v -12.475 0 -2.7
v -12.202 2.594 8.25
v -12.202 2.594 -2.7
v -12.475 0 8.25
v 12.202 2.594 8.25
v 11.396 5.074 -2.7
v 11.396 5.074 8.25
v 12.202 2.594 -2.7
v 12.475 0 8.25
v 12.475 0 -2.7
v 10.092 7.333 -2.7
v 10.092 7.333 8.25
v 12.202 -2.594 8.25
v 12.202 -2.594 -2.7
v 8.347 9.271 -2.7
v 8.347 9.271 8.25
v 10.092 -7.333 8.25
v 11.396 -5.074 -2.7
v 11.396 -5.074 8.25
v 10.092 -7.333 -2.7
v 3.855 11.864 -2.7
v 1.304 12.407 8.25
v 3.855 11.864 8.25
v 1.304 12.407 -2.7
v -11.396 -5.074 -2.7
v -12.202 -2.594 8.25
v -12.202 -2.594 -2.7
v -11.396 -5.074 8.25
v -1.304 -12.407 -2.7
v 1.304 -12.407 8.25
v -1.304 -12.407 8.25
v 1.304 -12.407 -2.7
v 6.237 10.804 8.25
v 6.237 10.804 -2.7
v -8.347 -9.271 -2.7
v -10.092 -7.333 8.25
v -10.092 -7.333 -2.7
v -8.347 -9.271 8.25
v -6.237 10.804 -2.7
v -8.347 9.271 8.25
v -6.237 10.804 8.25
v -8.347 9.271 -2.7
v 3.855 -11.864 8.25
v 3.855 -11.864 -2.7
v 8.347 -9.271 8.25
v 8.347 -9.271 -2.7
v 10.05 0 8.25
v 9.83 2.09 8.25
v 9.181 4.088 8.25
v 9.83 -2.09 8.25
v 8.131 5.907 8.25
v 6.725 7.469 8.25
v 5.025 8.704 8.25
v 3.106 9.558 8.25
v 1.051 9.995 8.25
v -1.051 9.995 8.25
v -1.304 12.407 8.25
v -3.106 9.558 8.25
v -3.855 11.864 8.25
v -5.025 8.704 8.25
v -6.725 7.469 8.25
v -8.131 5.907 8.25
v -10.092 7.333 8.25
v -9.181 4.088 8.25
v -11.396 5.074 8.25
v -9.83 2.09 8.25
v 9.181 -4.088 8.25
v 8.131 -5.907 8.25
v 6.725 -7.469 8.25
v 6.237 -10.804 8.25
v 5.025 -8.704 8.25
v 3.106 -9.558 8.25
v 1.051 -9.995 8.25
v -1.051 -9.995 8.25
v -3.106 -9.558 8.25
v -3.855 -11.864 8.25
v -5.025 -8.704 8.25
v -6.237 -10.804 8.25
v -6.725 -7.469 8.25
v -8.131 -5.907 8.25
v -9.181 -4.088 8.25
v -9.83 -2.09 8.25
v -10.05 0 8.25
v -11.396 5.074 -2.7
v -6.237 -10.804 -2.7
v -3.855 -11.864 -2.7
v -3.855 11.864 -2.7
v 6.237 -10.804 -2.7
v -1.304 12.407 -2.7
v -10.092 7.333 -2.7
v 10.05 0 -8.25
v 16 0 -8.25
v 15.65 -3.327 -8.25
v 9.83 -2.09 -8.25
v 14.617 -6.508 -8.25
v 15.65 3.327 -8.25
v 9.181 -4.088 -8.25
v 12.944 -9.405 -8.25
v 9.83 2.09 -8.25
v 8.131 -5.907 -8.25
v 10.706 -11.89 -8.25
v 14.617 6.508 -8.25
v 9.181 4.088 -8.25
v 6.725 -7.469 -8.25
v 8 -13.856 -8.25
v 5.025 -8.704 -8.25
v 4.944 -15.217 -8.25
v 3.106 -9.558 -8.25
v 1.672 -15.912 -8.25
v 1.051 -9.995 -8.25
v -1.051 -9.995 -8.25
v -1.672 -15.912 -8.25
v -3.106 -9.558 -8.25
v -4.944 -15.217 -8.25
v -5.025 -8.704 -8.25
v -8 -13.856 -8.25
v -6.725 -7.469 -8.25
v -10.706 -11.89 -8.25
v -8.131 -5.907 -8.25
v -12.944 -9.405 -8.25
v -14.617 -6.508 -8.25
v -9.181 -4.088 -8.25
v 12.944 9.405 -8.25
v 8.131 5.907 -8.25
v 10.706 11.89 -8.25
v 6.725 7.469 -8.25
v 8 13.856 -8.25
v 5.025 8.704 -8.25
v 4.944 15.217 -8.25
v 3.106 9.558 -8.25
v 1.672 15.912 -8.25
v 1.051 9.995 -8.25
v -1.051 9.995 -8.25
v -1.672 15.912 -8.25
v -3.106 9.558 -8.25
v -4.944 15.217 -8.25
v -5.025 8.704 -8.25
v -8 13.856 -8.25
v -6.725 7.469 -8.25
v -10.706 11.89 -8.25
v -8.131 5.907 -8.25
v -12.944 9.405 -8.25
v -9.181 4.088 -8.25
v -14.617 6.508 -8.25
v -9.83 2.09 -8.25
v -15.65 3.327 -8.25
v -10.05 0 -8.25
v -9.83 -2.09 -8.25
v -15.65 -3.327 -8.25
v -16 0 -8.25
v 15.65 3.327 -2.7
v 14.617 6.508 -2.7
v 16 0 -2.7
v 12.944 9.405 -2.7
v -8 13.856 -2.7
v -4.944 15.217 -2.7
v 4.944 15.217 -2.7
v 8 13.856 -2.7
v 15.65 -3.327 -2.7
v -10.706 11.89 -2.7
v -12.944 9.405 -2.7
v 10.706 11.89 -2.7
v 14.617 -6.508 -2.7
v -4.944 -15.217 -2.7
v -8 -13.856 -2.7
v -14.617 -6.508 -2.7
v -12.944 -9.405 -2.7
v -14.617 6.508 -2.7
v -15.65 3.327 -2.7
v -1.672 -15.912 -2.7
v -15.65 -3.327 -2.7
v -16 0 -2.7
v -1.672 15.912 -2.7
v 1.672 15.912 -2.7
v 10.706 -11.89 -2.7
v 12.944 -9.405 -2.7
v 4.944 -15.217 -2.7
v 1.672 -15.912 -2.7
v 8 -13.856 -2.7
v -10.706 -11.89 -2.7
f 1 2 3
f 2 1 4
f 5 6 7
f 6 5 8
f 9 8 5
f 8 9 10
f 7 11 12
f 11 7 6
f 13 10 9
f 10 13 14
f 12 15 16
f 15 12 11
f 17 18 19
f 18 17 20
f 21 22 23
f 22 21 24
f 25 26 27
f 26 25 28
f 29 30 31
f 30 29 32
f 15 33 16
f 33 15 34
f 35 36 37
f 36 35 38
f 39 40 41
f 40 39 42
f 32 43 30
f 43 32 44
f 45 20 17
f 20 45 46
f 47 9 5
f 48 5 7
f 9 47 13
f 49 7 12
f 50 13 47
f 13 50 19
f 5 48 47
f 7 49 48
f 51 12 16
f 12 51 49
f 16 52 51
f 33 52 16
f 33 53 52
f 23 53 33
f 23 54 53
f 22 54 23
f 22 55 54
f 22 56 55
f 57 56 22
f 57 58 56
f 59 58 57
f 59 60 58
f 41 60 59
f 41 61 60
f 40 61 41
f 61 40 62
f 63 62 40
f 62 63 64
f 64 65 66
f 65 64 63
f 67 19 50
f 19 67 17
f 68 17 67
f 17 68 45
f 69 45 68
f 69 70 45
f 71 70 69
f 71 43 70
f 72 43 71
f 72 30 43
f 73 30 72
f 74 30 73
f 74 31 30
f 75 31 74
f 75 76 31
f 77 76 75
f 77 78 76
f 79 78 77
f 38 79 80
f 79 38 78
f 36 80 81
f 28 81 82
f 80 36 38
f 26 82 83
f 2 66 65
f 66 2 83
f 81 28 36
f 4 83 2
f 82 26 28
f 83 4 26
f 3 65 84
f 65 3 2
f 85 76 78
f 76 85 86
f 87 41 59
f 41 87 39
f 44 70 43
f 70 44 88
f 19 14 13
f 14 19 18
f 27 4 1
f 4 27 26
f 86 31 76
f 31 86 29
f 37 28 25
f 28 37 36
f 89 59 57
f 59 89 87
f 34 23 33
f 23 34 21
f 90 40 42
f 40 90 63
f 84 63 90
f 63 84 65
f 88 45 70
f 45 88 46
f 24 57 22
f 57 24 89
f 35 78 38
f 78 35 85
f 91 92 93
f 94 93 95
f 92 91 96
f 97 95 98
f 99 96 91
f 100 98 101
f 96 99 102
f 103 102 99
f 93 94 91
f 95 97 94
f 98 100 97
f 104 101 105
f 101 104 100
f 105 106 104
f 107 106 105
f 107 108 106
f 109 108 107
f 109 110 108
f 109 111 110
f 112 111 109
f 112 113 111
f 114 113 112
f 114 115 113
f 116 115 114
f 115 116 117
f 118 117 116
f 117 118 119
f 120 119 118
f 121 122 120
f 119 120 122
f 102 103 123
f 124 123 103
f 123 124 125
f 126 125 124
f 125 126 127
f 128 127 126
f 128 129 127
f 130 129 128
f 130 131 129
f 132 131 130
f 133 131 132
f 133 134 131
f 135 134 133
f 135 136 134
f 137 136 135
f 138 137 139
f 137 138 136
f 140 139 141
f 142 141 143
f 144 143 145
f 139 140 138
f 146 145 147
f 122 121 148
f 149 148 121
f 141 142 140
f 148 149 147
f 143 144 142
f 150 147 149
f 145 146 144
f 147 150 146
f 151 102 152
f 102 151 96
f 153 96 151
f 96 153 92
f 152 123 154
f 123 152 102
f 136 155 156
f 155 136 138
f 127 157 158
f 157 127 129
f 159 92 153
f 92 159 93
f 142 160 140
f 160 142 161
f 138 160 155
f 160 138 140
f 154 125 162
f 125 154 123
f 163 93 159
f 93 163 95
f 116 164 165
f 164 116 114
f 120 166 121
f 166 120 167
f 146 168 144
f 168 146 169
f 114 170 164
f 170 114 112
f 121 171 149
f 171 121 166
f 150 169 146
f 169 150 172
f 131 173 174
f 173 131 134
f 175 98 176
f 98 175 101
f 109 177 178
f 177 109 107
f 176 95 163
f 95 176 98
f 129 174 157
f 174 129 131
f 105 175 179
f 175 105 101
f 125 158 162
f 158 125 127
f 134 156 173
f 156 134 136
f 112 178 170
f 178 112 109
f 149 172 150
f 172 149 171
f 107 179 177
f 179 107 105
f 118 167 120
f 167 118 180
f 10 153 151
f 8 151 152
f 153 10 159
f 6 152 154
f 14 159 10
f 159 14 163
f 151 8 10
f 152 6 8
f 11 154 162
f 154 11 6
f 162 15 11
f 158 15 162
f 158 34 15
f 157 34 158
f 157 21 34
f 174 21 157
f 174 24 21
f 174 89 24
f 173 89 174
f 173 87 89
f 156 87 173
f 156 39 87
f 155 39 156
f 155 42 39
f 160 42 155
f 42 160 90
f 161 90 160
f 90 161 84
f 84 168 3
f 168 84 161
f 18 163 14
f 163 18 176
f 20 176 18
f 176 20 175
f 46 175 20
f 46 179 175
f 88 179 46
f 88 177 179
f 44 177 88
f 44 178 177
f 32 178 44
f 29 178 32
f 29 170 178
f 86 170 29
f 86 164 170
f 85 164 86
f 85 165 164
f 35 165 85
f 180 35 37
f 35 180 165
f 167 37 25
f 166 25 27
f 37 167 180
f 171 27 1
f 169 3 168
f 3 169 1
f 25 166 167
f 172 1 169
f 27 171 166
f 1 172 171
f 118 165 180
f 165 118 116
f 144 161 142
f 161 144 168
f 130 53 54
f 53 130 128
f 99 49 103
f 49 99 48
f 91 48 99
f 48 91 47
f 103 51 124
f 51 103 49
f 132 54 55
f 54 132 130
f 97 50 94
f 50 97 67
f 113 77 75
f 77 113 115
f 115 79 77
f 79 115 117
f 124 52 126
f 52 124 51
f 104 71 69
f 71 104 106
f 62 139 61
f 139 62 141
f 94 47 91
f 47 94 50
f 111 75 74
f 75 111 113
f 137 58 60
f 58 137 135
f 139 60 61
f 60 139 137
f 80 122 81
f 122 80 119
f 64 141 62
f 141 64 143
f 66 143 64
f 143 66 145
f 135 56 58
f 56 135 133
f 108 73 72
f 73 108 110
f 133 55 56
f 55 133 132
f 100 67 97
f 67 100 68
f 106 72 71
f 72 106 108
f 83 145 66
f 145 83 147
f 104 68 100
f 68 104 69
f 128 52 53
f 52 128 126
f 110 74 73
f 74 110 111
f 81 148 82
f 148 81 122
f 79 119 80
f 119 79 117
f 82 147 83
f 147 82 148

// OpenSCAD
// file: spacerUtils.scad
/**
 * @file spacerUtils.scad
 *
 * @version 1.0
 *
 * @author Calum Judd Anderson
 *
 * @brief Aprilia RS 125 2006-2011 spacer utilities
 */
INTERFERENCE_FIT = 0.001;
SLIDE_FIT = 0.05;

SPROCKET_CARRIER_SPACER_HEIGHT = 17;
BRAKE_CARRIER_SPACER_HEIGHT = 15.25;

SPACER_OUTER_RADIUS = 15;
SPINDLE_RADIUS = 10;
SWINGING_ARM_FACE_RADIUS = 17.5;
SWINGING_ARM_FACE_HEIGHT = 5;

CAPTIVE_LIP_HEIGHT = 1.75;
CAPTIVE_LIP_RADIUS = SPACER_OUTER_RADIUS + 0.5;

SPROCKET_CARRIER_INNER_BEARING_SPACER_HEIGHT = 16.5;

SPROCKET_CARRIER_INNER_BEARING_OUTER_RADIUS = 12.475;
SPROCKET_CARRIER_INNER_BEARING_FACE_RADIUS = 16;
SPROCKET_CARRIER_INNER_BEARING_FACE_HEIGHT = 5.55;

/**
 * @brief Aprilia RS 125 2006-2011 rear brake carrier side spacer with captive flange
 */
module brakeCarrierSpacer() {
    difference() {
        union() {
            cylinder(BRAKE_CARRIER_SPACER_HEIGHT, SPACER_OUTER_RADIUS, SPACER_OUTER_RADIUS, center=true);
            translate([0, 0, (-(BRAKE_CARRIER_SPACER_HEIGHT -SWINGING_ARM_FACE_HEIGHT)/2)])
                cylinder(SWINGING_ARM_FACE_HEIGHT, SWINGING_ARM_FACE_RADIUS, SWINGING_ARM_FACE_RADIUS, center=true);
            translate([0, 0, ((BRAKE_CARRIER_SPACER_HEIGHT - CAPTIVE_LIP_HEIGHT)/2)])
                cylinder(CAPTIVE_LIP_HEIGHT, CAPTIVE_LIP_RADIUS, CAPTIVE_LIP_RADIUS, center=true);
        }
        cylinder(BRAKE_CARRIER_SPACER_HEIGHT + INTERFERENCE_FIT, SPINDLE_RADIUS + SLIDE_FIT, SPINDLE_RADIUS + SLIDE_FIT, center=true);
    }
}

/**
 * @brief Aprilia RS 125 2006-2011 rear sprocket carrier side internal spacer
 */
module sprocketCarrierInnerBearingSpacer() {
    difference() {
        union() {
            cylinder(SPROCKET_CARRIER_INNER_BEARING_SPACER_HEIGHT, SPROCKET_CARRIER_INNER_BEARING_OUTER_RADIUS, SPROCKET_CARRIER_INNER_BEARING_OUTER_RADIUS, center=true);
            translate([0, 0, (-(SPROCKET_CARRIER_INNER_BEARING_SPACER_HEIGHT -SPROCKET_CARRIER_INNER_BEARING_FACE_HEIGHT)/2)])
                cylinder(SPROCKET_CARRIER_INNER_BEARING_FACE_HEIGHT, SPROCKET_CARRIER_INNER_BEARING_FACE_RADIUS, SPROCKET_CARRIER_INNER_BEARING_FACE_RADIUS, center=true);
        }
        cylinder(SPROCKET_CARRIER_INNER_BEARING_SPACER_HEIGHT + INTERFERENCE_FIT, SPINDLE_RADIUS + SLIDE_FIT, SPINDLE_RADIUS + SLIDE_FIT, center=true);
    }
}

/**
 * @brief Aprilia RS 125 2006-2011 rear sprocket carrier side spacer with captive flange
 */
module sprocketCarrierSpacer() {
    difference() {
        union() {
            cylinder(SPROCKET_CARRIER_SPACER_HEIGHT, SPACER_OUTER_RADIUS, SPACER_OUTER_RADIUS, center=true);
            translate([0, 0, (-(SPROCKET_CARRIER_SPACER_HEIGHT -SWINGING_ARM_FACE_HEIGHT)/2)])
                cylinder(SWINGING_ARM_FACE_HEIGHT, SWINGING_ARM_FACE_RADIUS, SWINGING_ARM_FACE_RADIUS, center=true);
            translate([0, 0, ((SPROCKET_CARRIER_SPACER_HEIGHT - CAPTIVE_LIP_HEIGHT)/2)])
                cylinder(CAPTIVE_LIP_HEIGHT, CAPTIVE_LIP_RADIUS, CAPTIVE_LIP_RADIUS, center=true);
        }
        cylinder(SPROCKET_CARRIER_SPACER_HEIGHT + INTERFERENCE_FIT, SPINDLE_RADIUS + SLIDE_FIT, SPINDLE_RADIUS + SLIDE_FIT, center=true);
    }
}
// main file
/**
 * @file sprocketCarrierInnerBearingSpacer.scad
 *
 * @version 1.0
 *
 * @author Calum Judd Anderson
 *
 * @brief Aprilia RS 125 2006-2011 rear sprocket inner bearing spacer
 */
include <spacerUtils.scad>

sprocketCarrierInnerBearingSpacer();
